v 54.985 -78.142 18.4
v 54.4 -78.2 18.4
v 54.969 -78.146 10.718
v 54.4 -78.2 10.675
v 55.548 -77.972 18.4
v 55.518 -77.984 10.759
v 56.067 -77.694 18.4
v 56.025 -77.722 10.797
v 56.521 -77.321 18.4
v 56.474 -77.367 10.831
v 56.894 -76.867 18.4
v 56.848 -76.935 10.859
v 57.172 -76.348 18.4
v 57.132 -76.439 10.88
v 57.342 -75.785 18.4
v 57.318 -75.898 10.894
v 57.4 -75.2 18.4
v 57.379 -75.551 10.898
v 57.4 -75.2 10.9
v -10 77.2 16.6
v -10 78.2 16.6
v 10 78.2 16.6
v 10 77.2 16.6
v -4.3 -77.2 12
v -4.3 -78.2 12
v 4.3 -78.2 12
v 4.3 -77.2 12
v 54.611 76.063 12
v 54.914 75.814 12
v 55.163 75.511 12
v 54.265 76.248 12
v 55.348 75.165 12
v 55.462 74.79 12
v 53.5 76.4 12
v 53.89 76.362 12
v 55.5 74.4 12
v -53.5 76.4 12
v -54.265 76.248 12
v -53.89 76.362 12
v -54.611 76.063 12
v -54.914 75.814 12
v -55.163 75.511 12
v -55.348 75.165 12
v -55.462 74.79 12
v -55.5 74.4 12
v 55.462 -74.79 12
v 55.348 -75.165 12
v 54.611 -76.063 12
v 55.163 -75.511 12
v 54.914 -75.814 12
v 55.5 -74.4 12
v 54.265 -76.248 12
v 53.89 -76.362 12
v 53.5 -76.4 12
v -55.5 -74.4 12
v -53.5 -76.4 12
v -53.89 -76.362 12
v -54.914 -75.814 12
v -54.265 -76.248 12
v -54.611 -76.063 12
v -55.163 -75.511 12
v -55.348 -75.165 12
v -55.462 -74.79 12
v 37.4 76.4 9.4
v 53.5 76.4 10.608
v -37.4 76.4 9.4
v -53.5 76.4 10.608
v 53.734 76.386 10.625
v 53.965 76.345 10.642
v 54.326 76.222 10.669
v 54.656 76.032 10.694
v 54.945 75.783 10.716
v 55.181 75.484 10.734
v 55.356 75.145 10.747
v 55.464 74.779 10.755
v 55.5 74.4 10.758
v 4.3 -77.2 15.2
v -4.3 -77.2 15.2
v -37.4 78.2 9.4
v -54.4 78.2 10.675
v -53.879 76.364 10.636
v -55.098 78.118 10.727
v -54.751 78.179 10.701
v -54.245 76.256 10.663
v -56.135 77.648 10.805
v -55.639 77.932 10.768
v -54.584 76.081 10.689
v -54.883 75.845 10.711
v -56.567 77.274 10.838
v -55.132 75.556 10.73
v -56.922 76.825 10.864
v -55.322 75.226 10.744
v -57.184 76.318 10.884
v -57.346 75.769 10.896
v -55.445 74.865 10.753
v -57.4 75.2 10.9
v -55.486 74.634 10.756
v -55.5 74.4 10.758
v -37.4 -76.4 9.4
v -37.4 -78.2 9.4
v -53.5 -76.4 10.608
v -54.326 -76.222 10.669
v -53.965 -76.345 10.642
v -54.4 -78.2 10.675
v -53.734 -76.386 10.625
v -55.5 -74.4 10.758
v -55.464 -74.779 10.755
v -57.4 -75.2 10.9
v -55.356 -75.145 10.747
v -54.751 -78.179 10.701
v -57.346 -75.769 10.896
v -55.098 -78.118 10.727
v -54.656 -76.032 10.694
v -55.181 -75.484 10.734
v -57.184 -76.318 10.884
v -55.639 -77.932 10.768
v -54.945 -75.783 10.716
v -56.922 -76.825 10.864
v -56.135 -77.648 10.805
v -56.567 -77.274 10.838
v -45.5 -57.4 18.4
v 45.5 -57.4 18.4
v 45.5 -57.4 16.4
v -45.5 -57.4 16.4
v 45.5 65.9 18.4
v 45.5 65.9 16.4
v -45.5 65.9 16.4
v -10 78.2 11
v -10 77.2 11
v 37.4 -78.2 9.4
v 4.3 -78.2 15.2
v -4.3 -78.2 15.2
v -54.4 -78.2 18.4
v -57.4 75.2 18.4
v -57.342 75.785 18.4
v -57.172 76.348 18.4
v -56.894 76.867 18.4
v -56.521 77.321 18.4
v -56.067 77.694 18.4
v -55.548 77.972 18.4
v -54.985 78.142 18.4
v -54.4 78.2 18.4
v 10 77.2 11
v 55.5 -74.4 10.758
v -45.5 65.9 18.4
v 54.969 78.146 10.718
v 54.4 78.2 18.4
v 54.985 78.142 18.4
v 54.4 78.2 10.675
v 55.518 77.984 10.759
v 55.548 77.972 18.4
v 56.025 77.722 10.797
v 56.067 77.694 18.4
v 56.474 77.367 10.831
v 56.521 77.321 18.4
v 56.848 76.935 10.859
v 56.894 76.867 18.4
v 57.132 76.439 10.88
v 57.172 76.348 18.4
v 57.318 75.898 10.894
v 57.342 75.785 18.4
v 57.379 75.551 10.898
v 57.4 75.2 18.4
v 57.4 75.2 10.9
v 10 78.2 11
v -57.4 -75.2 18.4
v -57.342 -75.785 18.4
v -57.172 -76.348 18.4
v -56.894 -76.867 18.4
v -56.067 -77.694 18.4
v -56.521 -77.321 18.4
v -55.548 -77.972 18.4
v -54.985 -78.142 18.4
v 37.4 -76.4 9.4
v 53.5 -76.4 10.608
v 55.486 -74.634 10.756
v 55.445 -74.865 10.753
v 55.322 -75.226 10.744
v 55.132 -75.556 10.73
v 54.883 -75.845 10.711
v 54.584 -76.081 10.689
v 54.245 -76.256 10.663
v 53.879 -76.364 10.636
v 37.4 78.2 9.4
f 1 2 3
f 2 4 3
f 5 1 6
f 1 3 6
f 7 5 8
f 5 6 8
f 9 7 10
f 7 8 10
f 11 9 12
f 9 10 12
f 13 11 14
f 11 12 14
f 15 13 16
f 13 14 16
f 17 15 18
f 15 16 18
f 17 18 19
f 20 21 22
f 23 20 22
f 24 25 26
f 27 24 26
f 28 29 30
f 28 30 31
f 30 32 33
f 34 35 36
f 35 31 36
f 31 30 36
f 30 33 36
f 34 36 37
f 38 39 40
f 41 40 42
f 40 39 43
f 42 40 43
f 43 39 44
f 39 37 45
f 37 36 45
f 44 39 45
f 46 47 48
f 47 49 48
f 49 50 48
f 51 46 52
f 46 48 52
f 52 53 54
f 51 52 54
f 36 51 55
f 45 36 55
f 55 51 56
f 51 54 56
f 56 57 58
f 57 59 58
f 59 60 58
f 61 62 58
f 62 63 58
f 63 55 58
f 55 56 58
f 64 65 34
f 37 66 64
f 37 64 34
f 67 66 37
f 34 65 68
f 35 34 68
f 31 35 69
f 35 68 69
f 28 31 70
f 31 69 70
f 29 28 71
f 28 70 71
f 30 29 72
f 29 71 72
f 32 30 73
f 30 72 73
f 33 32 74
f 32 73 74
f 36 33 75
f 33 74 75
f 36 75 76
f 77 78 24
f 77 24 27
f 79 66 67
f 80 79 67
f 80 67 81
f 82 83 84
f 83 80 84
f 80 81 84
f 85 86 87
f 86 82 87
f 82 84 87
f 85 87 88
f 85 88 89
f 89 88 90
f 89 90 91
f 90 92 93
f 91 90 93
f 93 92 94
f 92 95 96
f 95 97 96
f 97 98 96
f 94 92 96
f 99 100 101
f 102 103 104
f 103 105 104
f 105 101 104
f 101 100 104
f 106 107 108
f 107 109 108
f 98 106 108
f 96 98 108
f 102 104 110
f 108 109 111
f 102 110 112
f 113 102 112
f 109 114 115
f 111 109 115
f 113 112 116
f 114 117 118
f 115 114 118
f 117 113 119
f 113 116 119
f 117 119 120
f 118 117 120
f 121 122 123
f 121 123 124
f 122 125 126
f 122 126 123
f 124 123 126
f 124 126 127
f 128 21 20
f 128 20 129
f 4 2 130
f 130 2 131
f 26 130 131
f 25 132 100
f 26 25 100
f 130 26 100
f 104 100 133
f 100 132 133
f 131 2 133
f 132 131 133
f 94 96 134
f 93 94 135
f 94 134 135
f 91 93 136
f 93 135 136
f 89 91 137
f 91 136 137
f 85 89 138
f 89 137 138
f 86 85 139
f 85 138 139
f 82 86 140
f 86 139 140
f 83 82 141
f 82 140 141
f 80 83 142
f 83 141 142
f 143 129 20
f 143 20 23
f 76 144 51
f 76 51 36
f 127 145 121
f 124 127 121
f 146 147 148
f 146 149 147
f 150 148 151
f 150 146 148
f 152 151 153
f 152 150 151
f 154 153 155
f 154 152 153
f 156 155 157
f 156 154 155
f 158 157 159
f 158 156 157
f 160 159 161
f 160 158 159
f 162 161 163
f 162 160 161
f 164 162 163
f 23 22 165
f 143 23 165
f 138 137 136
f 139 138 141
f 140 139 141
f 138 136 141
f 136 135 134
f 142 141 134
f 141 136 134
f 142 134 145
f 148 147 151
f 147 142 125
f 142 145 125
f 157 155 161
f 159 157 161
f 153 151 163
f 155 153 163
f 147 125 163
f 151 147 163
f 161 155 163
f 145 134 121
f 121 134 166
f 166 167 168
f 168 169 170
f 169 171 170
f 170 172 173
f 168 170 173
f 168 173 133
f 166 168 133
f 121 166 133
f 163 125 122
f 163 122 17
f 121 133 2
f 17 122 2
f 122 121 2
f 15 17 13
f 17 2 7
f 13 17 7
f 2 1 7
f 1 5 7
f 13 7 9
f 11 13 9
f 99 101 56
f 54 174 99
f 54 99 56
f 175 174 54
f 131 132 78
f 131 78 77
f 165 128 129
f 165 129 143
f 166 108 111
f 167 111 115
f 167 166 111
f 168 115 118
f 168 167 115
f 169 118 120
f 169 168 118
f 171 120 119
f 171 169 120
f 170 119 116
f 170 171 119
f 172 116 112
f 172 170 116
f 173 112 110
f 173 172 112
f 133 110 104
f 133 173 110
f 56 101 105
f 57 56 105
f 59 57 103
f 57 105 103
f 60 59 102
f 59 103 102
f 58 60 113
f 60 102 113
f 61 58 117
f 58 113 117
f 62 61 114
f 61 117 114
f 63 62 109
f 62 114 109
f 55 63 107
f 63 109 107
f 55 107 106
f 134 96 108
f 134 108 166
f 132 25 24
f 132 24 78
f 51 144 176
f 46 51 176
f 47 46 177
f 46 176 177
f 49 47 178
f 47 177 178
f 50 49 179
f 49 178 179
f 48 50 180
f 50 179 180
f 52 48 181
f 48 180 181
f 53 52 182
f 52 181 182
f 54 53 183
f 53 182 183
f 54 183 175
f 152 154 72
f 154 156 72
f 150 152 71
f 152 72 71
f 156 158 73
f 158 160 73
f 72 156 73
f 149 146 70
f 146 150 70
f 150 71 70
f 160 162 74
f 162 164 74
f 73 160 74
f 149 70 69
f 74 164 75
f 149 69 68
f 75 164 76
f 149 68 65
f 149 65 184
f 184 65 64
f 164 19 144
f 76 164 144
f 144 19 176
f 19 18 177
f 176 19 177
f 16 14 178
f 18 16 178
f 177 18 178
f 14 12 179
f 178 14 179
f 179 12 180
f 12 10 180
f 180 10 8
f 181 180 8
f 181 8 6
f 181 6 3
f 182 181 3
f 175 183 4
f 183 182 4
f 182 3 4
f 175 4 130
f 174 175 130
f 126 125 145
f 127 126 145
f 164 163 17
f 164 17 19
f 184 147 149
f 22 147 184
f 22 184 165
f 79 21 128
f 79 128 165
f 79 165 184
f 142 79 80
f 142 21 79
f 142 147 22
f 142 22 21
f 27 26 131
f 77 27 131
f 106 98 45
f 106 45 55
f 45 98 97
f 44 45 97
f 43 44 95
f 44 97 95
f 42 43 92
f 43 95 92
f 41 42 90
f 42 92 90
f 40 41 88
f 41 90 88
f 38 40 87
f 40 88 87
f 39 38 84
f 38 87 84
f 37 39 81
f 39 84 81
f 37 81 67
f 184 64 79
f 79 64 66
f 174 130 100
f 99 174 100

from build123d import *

# Parameters (mm, degrees)
PAD_DEPTH       = 78.2
PAD_DEPTH_BACK  = 78.2
SKETCH004_W     = 91
SKETCH004_H     = 123.3
POCKET_DEPTH    = 2
POCKET001_DEPTH = 2.6
FILLET_R        = 3
SKETCH012_W     = 8.6
SKETCH012_H     = 3.2
POCKET003_DEPTH = 1
SKETCH013_W     = 20
SKETCH013_H     = 5.6
POCKET004_DEPTH = 1


with BuildPart() as part:
    # Sketch003 → Pad (new body, two sides)
    with BuildSketch(Plane.XZ) as pad_sk:
        Polygon((-57.4, 6.4), (57.4, 6.4), (57.4, -1.1), (37.4, -2.6), (-37.4, -2.6), (-57.4, -1.1), align=None)
    extrude(amount=PAD_DEPTH)
    extrude(pad_sk.sketch, amount=-PAD_DEPTH_BACK)

    # Sketch004 (on Face2 of Pad) → Pocket (cut)
    with BuildSketch(Plane(origin=(0, 0, 6.4), x_dir=(-1, 0, 0), z_dir=(0, 0, 1))):
        with Locations((0, -4.25)):
            Rectangle(SKETCH004_W, SKETCH004_H)
    extrude(amount=-POCKET_DEPTH, mode=Mode.SUBTRACT)

    # Sketch005 (on Face6 of Pocket) → Pocket001 (cut)
    with BuildSketch(Plane(origin=(0, 0, -2.6), x_dir=(1, 0, 0), z_dir=(0, 0, -1))):
        with BuildLine():
            Line((-53.5, 76.4), (53.5, 76.4))
            ThreePointArc((55.5, 74.4), (54.914214, 75.814214), (53.5, 76.4))
            Line((55.5, 74.4), (55.5, -74.4))
            ThreePointArc((53.5, -76.4), (54.914214, -75.814214), (55.5, -74.4))
            Line((53.5, -76.4), (-53.5, -76.4))
            ThreePointArc((-55.5, -74.4), (-54.914214, -75.814214), (-53.5, -76.4))
            Line((-55.5, -74.4), (-55.5, 74.4))
            ThreePointArc((-53.5, 76.4), (-54.914214, 75.814214), (-55.5, 74.4))
        make_face()
    extrude(amount=-POCKET001_DEPTH, mode=Mode.SUBTRACT)

    # Fillet
    fillet_edges = [part.edges().sort_by_distance(p)[0] for p in [
        (57.4, -78.2, 2.65),
        (57.4, 78.2, 2.65),
        (-57.4, -78.2, 2.65),
        (-57.4, 78.2, 2.65),
    ]]
    fillet(fillet_edges, radius=FILLET_R)

    # Sketch012 (on Face10 of Fillet) → Pocket003 (cut)
    with BuildSketch(Plane.XZ.offset(78.2)):
        with Locations((0, 1.6)):
            Rectangle(SKETCH012_W, SKETCH012_H)
    extrude(amount=-POCKET003_DEPTH, mode=Mode.SUBTRACT)

    # Sketch013 (on Face6 of Pocket003) → Pocket004 (cut)
    with BuildSketch(Plane(origin=(0, 78.2, 0), x_dir=(1, 0, 0), z_dir=(0, 1, 0))):
        with Locations((0, -1.8)):
            Rectangle(SKETCH013_W, SKETCH013_H)
    extrude(amount=-POCKET004_DEPTH, mode=Mode.SUBTRACT)


with BuildPart() as part_1:
    # Body003 placement: moved
    add(part.part.moved(Location((0, 0, 12))))


solid = part_1.part
